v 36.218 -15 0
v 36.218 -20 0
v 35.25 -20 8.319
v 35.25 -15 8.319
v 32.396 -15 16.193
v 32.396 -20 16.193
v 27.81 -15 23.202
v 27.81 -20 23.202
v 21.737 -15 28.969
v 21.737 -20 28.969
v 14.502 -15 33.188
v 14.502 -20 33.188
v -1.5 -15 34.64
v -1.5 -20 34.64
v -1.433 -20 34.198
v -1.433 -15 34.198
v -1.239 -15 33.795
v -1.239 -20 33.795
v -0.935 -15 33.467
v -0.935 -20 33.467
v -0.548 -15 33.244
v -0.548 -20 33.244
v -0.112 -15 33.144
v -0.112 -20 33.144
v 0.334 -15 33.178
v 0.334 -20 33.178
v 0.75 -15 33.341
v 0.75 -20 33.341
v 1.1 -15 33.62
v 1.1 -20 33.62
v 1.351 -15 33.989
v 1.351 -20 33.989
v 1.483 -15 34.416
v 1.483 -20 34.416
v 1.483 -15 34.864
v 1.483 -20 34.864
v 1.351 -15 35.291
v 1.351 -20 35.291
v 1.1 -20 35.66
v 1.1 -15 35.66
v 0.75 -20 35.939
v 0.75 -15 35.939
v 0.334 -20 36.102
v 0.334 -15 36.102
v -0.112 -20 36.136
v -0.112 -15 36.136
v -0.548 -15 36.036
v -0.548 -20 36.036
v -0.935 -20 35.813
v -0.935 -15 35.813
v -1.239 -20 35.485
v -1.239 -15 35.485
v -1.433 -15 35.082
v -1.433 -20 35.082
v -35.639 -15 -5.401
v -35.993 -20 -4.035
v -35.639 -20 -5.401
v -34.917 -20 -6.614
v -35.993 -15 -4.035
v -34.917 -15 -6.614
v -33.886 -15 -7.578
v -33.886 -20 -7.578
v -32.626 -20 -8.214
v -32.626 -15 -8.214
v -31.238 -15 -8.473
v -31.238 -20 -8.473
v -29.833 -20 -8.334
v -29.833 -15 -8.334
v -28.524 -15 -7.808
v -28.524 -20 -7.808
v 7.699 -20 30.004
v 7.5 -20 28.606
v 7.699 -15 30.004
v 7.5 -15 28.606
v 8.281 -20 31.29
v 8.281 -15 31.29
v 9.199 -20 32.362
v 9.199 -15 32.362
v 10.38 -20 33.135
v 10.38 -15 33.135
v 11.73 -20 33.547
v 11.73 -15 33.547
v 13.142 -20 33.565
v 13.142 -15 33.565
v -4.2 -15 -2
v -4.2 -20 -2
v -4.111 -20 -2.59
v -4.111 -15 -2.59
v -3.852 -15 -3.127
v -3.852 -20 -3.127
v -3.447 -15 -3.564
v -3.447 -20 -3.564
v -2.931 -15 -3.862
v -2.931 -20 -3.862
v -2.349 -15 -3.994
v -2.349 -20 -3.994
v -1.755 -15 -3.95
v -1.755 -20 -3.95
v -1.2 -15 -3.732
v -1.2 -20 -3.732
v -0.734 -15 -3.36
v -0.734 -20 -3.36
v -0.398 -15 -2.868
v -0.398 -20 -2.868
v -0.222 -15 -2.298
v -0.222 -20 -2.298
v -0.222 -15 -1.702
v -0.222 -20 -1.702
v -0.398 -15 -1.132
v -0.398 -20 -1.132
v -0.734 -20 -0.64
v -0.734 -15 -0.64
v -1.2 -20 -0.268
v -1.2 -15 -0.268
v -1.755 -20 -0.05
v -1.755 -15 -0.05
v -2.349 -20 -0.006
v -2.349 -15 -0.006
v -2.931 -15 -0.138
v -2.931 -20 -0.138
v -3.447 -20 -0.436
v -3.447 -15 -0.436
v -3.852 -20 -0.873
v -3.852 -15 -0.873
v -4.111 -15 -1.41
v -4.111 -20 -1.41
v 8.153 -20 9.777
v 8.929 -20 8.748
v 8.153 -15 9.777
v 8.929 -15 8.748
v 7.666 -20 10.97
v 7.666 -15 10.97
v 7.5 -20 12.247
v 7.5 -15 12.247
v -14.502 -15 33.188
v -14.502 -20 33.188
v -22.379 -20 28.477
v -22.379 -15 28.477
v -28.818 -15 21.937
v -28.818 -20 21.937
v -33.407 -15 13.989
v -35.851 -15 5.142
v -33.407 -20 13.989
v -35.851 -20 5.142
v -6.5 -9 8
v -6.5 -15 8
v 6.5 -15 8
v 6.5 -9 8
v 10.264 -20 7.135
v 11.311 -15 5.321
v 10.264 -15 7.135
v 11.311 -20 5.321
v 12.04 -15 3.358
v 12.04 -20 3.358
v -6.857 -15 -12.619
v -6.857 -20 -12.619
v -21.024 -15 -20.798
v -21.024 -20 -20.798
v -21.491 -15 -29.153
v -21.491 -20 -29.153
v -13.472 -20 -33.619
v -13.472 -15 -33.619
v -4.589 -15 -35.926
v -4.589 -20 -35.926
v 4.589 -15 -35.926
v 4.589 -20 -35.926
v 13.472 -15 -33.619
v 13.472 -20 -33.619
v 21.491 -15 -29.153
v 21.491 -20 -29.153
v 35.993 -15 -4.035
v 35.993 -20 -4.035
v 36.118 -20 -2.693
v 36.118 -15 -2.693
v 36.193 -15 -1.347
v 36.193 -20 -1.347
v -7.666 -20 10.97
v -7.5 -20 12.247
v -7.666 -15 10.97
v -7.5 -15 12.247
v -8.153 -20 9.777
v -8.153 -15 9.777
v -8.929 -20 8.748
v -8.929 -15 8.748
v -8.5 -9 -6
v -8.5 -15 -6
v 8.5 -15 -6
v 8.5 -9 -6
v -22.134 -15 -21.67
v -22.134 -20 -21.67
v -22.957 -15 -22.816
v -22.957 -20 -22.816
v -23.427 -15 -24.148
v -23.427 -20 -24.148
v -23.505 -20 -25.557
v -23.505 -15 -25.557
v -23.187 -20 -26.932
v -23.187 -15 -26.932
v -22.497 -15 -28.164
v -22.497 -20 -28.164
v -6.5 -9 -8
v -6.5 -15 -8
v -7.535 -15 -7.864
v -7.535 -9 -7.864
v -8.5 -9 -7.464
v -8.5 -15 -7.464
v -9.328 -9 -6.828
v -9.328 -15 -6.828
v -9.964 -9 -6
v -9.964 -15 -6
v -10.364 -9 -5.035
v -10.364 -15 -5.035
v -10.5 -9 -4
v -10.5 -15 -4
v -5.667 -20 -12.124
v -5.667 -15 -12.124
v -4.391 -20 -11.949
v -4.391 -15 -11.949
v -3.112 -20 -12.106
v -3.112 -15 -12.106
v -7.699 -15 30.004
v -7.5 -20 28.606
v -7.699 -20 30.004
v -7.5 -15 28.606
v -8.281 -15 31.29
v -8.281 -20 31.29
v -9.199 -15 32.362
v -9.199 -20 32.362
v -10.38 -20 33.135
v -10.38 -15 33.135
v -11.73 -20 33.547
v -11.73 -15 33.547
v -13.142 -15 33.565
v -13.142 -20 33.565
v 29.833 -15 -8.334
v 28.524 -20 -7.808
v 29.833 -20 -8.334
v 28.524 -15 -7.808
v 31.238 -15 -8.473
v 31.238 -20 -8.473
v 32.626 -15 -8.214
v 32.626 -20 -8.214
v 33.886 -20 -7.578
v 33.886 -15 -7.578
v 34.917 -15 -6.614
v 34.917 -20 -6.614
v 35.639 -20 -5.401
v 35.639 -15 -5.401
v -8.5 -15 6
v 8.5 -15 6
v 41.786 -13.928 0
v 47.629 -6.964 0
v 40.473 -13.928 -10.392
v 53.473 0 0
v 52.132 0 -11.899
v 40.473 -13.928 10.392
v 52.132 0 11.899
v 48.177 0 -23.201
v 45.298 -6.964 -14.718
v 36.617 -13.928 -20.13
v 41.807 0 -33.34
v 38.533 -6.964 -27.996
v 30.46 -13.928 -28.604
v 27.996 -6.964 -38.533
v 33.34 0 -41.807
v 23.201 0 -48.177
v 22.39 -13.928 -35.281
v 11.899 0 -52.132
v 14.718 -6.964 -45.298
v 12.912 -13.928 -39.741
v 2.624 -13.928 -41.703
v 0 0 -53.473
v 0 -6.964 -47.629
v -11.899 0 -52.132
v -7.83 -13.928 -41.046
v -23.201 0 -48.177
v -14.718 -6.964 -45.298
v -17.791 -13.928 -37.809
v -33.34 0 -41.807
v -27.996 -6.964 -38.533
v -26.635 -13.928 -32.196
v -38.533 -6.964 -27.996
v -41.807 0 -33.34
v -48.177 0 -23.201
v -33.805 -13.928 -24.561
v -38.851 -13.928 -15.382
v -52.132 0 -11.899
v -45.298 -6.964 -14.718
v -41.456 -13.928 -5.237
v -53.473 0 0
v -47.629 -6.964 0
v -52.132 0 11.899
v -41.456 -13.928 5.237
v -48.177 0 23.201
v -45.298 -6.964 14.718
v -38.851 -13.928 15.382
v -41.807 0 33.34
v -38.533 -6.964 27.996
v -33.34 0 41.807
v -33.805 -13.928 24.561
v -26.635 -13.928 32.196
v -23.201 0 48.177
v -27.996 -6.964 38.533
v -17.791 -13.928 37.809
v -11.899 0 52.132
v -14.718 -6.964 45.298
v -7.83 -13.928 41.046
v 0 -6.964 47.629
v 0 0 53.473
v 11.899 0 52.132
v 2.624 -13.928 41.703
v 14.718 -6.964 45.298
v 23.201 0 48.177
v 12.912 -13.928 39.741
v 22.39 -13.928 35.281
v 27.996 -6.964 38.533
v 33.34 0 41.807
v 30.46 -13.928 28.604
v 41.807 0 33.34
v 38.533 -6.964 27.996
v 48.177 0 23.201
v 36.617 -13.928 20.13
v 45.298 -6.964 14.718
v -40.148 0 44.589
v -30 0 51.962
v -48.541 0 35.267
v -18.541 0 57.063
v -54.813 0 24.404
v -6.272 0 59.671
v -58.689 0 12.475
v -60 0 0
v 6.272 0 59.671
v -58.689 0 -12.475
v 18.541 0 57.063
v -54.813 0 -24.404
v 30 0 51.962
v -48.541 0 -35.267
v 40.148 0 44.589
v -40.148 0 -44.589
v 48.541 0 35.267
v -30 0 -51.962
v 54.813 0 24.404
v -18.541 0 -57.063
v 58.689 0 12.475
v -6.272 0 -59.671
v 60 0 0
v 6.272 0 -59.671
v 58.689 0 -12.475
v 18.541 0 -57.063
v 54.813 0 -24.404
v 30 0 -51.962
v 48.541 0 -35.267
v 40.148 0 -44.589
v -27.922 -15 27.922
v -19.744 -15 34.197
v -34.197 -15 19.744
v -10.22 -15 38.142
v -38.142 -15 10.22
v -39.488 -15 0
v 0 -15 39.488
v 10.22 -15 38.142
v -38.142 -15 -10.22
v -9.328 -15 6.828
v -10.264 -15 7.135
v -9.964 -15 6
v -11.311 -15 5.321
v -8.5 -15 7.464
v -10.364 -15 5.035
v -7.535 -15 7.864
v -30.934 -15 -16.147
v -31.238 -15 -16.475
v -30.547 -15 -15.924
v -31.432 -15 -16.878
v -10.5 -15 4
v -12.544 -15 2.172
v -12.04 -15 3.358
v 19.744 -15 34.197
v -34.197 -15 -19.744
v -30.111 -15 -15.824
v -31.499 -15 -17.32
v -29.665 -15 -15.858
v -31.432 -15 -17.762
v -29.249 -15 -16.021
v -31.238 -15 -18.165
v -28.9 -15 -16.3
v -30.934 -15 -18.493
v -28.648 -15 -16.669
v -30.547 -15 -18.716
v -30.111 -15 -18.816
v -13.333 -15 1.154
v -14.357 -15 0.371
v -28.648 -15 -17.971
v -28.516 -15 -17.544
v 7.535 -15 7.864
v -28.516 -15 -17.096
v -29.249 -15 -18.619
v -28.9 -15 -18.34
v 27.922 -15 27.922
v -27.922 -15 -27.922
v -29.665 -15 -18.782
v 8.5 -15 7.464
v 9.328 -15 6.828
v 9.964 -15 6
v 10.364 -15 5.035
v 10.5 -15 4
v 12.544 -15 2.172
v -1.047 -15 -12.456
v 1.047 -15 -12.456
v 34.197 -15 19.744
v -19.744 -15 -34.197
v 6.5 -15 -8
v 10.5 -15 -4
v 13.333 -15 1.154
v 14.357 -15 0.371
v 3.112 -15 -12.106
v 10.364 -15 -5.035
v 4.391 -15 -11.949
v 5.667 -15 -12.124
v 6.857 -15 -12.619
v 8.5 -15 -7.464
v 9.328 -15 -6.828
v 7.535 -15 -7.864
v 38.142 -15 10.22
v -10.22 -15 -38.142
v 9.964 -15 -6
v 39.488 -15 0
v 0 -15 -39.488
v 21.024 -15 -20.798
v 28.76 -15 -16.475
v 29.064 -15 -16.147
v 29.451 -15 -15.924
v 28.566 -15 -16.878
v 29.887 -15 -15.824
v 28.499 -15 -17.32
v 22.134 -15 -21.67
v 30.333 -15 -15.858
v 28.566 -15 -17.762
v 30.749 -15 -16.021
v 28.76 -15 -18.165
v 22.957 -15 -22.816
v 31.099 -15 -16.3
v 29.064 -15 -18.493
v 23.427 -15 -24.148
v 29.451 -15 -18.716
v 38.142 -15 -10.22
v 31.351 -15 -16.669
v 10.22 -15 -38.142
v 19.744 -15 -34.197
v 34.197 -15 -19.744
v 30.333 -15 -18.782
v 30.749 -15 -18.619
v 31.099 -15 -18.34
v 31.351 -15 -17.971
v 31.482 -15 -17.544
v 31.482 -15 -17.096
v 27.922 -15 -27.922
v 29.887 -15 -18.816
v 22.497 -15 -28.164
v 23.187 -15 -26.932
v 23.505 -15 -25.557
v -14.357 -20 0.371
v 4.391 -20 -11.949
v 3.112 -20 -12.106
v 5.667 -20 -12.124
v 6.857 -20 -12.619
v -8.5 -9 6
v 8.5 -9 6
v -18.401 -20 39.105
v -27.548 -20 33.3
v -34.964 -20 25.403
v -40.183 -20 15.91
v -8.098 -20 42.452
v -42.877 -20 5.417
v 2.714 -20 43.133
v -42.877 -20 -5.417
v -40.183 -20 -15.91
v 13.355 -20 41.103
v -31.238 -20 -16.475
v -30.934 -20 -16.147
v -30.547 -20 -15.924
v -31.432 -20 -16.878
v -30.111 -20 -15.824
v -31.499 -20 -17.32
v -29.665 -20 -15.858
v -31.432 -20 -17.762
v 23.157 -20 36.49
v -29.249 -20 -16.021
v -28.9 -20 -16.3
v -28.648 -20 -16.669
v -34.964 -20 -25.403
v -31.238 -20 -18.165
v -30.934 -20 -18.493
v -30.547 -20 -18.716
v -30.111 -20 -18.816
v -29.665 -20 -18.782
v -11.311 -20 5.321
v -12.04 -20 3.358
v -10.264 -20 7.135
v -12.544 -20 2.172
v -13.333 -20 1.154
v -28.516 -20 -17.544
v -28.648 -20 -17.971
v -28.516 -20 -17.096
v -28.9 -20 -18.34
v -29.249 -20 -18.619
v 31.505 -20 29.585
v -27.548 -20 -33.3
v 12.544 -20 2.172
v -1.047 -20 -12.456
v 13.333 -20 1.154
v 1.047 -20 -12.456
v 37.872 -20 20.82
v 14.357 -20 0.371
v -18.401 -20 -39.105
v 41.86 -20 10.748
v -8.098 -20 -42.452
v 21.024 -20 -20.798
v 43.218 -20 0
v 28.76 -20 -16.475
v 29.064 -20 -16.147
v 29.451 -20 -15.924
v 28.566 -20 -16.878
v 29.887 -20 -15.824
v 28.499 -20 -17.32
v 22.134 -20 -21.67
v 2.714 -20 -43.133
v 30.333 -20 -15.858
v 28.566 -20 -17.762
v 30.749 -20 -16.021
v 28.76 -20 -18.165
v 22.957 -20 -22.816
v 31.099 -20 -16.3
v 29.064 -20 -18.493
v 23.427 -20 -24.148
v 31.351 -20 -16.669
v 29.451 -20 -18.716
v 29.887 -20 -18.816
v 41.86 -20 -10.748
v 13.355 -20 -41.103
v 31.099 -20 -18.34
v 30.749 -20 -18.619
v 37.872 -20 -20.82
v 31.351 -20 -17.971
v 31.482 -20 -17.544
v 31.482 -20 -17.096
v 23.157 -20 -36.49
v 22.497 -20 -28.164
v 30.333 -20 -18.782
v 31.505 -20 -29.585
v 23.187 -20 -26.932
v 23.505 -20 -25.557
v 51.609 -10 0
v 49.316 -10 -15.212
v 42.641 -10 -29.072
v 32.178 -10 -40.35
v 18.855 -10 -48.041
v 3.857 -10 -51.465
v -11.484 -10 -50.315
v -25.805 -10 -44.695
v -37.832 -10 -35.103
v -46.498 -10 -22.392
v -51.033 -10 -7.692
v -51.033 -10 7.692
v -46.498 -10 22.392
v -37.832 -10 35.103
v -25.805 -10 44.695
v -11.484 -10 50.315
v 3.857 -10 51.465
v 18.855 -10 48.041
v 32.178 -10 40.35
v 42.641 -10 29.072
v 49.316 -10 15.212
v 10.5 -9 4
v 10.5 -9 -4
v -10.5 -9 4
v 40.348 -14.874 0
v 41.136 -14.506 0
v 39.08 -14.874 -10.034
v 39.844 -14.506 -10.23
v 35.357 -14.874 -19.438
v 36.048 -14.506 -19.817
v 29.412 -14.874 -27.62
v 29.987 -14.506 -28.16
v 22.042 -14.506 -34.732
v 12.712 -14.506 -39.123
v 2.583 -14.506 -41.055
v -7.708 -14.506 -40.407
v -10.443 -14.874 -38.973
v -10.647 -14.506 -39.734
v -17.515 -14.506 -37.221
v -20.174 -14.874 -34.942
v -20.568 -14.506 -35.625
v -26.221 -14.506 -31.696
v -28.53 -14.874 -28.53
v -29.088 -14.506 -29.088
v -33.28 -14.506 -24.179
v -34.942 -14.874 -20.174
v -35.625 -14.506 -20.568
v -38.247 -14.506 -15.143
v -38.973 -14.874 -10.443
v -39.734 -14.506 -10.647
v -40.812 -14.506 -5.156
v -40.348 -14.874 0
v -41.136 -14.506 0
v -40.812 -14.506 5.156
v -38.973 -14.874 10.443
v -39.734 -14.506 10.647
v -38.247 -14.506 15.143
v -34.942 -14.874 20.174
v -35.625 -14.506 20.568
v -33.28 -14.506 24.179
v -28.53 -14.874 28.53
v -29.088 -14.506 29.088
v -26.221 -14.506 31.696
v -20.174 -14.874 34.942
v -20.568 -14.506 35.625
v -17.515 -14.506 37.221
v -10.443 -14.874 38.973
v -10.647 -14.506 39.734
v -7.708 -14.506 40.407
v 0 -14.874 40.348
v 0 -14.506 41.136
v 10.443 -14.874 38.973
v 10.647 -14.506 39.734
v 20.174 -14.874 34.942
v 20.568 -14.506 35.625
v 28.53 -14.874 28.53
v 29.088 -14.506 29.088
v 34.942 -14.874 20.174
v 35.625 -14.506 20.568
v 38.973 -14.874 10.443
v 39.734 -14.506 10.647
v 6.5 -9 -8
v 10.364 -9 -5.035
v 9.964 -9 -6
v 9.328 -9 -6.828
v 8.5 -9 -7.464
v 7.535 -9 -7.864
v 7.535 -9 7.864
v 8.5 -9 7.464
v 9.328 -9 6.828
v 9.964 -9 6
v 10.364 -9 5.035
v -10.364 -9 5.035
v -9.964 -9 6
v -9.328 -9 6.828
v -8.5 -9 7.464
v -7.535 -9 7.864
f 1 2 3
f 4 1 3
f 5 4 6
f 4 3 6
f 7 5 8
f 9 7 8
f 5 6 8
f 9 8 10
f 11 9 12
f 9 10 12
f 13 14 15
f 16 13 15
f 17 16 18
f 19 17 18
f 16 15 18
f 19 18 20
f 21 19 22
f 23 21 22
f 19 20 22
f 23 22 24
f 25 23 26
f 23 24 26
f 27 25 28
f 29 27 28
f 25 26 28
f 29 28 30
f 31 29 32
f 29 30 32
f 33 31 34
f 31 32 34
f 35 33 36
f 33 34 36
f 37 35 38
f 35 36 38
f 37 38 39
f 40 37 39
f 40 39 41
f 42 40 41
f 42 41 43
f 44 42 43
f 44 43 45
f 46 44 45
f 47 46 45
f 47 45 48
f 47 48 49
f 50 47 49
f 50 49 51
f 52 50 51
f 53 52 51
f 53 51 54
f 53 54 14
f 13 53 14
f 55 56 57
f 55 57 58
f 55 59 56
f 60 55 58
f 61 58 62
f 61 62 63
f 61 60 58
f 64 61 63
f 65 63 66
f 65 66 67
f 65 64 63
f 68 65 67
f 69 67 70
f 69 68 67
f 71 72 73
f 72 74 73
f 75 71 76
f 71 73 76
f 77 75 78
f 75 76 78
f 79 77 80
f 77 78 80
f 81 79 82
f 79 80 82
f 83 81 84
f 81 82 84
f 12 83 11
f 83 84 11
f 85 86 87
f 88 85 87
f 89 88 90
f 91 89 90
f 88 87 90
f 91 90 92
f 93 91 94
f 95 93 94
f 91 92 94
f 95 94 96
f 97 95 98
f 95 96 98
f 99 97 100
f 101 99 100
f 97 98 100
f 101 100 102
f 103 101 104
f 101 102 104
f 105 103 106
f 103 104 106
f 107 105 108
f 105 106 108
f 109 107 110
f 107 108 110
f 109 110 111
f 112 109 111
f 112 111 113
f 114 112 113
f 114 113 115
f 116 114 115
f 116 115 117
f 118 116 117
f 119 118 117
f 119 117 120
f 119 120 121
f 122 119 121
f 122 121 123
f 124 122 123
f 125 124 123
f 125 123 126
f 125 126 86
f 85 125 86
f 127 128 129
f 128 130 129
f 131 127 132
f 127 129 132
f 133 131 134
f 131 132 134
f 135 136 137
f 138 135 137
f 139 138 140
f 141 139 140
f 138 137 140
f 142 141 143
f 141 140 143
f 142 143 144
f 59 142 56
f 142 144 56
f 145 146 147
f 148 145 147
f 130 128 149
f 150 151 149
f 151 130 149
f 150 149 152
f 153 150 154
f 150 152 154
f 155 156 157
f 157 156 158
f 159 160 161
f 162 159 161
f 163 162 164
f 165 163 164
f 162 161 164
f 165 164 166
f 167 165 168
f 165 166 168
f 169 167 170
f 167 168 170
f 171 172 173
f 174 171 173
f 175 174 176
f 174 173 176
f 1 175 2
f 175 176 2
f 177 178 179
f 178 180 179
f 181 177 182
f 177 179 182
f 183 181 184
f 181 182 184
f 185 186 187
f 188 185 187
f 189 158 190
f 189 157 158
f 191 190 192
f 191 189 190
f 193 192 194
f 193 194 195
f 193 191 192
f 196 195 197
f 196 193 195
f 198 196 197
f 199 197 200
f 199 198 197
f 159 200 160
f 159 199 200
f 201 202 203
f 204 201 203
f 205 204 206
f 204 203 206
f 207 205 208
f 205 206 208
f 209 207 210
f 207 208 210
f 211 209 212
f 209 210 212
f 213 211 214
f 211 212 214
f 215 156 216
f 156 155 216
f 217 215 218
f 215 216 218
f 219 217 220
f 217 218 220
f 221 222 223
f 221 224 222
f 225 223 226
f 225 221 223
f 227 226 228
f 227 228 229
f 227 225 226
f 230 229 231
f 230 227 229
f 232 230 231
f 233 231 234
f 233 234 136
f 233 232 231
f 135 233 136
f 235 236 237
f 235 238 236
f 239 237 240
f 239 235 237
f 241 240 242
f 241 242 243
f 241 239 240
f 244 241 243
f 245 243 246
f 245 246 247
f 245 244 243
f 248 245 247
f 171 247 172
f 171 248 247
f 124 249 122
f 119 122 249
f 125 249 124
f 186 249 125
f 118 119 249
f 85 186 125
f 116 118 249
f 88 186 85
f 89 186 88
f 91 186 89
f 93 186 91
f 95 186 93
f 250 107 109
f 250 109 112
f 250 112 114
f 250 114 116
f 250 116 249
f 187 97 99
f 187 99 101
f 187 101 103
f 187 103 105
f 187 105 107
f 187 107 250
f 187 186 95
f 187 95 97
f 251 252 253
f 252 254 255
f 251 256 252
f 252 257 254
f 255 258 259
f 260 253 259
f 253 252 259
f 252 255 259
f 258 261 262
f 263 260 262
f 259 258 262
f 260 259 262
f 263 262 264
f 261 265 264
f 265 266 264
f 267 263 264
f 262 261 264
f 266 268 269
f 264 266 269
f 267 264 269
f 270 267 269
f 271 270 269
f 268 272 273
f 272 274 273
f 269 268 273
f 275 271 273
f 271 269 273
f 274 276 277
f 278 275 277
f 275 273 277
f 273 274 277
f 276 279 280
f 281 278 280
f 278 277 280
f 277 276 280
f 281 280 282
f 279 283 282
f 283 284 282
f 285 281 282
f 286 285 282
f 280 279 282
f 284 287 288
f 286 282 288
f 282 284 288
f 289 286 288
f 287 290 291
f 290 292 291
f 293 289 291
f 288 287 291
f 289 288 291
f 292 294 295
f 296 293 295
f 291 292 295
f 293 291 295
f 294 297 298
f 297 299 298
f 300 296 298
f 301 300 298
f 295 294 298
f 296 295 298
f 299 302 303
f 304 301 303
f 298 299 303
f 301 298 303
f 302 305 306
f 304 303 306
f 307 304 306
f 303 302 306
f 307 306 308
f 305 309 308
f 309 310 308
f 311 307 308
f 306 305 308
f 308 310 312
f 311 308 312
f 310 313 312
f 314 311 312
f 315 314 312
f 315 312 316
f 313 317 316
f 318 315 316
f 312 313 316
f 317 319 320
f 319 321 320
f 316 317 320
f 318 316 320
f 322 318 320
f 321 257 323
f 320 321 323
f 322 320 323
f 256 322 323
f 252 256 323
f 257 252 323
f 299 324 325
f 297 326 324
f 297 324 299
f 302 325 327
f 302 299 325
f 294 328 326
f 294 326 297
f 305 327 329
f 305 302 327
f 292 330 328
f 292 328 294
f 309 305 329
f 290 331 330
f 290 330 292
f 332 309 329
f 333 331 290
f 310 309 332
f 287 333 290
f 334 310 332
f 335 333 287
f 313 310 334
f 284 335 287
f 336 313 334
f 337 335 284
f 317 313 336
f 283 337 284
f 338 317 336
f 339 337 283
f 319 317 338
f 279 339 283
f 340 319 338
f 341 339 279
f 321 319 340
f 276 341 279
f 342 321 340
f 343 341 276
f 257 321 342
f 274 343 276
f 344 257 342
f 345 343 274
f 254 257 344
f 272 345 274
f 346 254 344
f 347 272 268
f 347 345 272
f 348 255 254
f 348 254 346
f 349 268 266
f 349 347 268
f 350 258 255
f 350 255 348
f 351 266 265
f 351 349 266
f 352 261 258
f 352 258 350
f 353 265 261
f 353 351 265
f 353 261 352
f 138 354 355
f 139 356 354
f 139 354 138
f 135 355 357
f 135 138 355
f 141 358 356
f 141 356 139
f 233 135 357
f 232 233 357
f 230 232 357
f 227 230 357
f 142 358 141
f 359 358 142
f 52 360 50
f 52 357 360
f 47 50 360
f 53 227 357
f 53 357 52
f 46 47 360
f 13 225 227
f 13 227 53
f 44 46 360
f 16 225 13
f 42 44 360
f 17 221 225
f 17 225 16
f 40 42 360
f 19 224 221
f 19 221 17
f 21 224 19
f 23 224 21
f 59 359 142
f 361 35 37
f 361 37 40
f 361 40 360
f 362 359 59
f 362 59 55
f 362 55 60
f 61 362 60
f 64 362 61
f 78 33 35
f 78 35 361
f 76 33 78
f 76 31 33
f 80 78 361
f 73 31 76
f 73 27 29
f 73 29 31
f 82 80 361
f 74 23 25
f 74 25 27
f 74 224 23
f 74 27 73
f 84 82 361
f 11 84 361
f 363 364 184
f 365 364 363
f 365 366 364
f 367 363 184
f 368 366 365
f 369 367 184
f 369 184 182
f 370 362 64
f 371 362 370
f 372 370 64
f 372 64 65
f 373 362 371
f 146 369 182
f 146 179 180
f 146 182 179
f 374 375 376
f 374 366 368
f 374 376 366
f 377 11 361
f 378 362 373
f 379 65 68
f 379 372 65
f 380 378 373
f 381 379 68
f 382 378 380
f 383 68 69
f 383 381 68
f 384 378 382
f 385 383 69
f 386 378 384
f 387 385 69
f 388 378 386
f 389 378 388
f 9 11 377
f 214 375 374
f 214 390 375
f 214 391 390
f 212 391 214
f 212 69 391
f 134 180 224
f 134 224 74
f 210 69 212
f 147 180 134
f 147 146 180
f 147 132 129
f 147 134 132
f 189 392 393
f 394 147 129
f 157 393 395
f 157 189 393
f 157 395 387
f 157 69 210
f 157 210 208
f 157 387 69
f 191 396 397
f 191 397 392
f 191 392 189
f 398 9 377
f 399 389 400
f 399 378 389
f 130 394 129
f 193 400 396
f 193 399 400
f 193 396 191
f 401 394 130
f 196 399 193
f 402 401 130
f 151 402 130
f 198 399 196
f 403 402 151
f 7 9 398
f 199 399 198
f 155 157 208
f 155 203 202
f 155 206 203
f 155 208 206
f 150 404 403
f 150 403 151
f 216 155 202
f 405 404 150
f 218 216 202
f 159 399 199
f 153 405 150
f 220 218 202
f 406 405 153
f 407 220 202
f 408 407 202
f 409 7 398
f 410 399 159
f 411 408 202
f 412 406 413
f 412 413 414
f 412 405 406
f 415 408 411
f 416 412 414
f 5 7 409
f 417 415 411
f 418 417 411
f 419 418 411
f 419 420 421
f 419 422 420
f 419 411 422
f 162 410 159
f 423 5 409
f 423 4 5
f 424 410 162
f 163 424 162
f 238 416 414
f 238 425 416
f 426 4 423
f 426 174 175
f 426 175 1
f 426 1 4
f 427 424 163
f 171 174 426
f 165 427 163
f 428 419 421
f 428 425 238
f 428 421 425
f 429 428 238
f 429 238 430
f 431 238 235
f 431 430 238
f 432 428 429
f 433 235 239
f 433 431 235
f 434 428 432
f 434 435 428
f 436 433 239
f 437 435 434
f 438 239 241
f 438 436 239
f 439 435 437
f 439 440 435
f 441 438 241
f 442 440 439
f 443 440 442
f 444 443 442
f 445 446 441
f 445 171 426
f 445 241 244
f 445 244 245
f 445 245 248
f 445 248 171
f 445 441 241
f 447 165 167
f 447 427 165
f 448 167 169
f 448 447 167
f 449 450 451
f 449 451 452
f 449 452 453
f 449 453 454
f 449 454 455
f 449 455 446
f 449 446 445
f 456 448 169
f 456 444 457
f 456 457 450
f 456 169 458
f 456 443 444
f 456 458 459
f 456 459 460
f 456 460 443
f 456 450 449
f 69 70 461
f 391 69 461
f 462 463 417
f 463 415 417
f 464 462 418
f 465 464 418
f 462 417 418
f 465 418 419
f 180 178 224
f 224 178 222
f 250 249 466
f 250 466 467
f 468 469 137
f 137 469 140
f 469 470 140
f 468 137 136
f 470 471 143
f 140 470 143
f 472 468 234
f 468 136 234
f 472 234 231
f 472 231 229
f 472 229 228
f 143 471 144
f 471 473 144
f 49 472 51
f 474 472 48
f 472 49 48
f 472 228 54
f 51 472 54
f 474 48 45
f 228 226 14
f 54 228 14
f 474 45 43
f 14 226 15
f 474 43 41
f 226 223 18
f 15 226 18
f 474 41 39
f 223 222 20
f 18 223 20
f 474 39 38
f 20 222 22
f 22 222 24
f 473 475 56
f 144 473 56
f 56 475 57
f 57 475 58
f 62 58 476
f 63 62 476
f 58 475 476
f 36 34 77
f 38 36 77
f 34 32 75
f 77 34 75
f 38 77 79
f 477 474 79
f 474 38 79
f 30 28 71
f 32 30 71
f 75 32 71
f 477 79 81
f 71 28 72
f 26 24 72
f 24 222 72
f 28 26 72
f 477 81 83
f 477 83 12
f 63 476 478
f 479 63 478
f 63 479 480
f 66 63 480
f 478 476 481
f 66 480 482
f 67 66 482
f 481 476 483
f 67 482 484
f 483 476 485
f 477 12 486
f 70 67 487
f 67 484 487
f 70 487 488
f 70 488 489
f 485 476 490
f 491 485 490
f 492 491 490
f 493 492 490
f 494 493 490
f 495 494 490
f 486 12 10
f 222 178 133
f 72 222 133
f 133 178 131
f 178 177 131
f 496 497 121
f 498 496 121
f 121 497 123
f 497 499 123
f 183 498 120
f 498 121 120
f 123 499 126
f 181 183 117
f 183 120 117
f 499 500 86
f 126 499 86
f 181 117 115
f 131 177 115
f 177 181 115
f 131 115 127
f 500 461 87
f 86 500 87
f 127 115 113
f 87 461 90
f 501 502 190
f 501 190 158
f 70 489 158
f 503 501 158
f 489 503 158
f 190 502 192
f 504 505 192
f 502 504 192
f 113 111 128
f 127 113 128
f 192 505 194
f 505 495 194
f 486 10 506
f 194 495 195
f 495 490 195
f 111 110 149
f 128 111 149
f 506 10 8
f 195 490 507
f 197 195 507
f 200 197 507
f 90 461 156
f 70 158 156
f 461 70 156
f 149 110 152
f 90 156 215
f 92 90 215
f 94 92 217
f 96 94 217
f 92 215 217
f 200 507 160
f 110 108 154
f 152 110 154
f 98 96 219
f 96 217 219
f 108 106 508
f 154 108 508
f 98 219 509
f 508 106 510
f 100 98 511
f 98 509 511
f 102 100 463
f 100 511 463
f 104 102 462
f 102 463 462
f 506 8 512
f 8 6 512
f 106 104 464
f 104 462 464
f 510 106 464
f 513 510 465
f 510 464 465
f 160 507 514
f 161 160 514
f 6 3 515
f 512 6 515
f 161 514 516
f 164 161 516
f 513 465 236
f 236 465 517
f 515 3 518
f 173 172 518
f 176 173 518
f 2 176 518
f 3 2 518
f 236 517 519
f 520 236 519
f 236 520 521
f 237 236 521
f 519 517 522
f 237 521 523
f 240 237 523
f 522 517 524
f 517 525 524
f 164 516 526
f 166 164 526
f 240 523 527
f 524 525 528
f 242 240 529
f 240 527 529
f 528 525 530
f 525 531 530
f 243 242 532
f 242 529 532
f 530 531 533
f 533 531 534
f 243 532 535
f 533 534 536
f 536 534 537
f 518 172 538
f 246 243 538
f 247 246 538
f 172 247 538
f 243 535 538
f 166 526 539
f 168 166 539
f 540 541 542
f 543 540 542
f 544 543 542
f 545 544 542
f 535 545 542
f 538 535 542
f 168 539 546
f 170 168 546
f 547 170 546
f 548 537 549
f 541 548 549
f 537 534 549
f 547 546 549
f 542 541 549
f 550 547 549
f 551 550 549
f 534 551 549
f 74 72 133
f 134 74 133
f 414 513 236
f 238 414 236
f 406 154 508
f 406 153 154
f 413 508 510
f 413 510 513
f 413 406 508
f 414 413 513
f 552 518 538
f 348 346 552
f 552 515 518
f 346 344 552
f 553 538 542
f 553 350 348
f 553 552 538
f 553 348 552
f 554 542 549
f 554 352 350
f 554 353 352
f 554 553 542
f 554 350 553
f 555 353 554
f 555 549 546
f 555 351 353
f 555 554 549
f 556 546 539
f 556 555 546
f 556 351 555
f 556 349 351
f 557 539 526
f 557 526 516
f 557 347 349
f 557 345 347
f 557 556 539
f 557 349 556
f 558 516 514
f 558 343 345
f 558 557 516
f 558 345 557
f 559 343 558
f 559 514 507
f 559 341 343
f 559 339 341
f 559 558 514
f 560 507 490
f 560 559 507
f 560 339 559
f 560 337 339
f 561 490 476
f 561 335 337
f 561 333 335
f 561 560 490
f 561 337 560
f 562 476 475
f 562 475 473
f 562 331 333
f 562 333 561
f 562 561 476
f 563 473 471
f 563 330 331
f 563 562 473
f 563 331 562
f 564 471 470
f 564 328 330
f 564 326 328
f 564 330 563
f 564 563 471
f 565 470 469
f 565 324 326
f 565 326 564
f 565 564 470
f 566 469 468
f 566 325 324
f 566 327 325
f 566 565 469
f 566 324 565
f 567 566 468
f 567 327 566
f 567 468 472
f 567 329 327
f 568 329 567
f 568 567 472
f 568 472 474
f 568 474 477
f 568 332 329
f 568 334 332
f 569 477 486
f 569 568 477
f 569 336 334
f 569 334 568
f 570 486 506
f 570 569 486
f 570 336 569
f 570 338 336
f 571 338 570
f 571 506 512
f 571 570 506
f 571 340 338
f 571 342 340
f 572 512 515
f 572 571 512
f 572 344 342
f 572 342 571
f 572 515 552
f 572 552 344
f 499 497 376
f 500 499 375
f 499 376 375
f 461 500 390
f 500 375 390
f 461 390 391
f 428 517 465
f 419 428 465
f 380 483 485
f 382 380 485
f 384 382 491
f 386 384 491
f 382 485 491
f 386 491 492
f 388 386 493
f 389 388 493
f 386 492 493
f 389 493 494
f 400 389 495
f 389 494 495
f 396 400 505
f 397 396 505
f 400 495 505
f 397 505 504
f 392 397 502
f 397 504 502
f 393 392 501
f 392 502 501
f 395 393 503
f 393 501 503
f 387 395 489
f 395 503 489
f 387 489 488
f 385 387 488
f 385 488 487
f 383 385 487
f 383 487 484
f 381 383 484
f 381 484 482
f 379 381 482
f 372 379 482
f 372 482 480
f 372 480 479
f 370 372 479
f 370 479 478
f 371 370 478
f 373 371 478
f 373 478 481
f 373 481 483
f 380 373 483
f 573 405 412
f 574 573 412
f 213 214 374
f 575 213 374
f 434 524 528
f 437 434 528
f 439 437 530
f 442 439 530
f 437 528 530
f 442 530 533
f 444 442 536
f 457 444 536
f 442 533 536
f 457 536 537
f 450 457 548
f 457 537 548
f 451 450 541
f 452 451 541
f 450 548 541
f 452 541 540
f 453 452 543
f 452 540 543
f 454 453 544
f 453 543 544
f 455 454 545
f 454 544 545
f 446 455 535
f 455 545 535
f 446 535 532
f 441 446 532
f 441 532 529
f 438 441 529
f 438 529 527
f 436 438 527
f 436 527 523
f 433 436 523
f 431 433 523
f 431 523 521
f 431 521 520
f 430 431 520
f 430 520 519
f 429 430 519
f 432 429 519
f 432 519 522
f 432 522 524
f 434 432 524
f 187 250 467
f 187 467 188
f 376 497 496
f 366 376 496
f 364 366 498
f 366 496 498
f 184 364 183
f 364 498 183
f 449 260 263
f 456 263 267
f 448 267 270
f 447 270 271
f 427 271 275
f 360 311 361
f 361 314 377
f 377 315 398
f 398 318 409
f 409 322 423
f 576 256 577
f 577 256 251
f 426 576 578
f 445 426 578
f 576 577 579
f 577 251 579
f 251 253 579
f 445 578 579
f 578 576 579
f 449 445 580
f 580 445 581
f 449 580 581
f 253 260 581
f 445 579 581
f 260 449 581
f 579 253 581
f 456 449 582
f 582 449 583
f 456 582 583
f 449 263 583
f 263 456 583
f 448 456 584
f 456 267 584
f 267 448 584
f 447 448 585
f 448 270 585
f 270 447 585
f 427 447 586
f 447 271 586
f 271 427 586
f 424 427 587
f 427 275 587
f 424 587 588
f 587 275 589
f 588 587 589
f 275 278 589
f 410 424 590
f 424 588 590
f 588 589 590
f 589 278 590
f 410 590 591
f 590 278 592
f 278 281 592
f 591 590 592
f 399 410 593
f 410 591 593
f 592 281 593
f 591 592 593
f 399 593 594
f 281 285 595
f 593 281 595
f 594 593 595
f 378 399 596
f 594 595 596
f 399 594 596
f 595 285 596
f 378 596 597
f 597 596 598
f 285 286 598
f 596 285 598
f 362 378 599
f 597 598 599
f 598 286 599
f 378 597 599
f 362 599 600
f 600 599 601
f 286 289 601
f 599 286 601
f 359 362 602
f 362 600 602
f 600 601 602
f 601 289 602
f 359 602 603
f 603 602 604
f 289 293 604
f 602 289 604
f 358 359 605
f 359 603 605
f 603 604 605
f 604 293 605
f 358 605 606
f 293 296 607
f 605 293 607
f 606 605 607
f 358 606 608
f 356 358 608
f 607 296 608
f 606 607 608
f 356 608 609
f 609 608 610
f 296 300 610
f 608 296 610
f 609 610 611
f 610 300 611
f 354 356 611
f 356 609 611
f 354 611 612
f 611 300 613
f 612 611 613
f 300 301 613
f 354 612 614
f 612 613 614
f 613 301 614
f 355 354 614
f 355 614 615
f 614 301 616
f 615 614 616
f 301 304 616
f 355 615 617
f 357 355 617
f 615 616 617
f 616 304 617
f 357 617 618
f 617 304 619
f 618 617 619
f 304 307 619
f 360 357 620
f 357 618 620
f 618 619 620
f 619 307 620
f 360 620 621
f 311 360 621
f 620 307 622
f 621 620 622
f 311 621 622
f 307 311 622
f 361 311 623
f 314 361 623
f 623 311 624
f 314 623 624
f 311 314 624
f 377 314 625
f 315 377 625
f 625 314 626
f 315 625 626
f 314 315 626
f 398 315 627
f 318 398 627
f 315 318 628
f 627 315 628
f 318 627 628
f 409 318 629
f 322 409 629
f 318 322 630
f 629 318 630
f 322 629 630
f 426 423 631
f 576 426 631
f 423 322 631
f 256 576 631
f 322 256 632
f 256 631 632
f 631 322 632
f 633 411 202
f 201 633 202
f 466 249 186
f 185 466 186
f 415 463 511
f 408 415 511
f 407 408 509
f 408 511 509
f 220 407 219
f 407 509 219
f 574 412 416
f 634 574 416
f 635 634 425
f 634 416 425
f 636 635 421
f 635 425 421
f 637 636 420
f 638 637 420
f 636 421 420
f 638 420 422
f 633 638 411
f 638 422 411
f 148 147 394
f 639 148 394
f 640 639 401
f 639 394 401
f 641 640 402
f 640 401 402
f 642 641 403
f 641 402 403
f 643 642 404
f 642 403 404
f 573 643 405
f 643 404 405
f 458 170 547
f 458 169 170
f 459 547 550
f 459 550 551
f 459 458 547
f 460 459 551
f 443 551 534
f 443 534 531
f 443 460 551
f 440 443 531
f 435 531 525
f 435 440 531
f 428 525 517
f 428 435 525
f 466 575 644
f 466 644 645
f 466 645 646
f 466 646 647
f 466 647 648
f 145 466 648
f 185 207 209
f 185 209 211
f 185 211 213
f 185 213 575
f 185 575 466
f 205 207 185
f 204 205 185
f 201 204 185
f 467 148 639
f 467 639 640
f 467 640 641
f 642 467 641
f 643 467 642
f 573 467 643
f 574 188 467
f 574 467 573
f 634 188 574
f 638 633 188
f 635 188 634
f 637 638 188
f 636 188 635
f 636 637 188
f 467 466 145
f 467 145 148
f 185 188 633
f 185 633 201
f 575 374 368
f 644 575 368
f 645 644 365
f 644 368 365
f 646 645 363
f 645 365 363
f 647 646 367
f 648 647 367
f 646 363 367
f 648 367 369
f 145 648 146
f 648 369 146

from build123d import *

# Parameters (mm, degrees)
SKETCH1_R             = 60
BOSS_EXTRUDE1_DEPTH   = 20
BOSS_EXTRUDE1_DRAFT   = -40
SHELL1_T              = -5
CUT_EXTRUDE2_DEPTH    = 20
SKETCH3_W             = 17
SKETCH3_H             = 12
BOSS_EXTRUDE2_DEPTH   = 6
F_3_0MM_DOWEL_HOLE1_D = 3
F_4_0MM_DOWEL_HOLE1_D = 4
FILLET1_R             = 5
FILLET2_R             = 3


with BuildPart() as part:
    # Sketch1 → Boss-Extrude1 (with draft: the straight prism first)
    with BuildSketch(Plane(origin=(0, 0, 0), x_dir=(1, 0, 0), z_dir=(0, 1, 0))):
        Circle(SKETCH1_R)
    extrude(amount=-BOSS_EXTRUDE1_DEPTH)
    # Boss-Extrude1: the draft: its side faces are tilted about the plane it starts from
    boss_extrude1_sides = [part.faces().sort_by_distance(p)[0] for p in [
        (-60, -10, 0),
    ]]
    draft(boss_extrude1_sides, Plane(origin=(0, 0, 0), x_dir=(1, 0, 0), z_dir=(0, 1, 0)), BOSS_EXTRUDE1_DRAFT)

    # Shell1
    shell1_openings = [part.faces().sort_by_distance(p)[0] for p in [
        (0, 0, 0),
    ]]
    offset(amount=SHELL1_T, openings=shell1_openings, kind=Kind.INTERSECTION)

    # Sketch2 → Cut-Extrude2 (cut)
    with BuildSketch(Plane.XZ.offset(20)):
        with BuildLine():
            ThreePointArc((-7.5, 35.432951589), (-31.365714462, 18.109003688), (-34.435836207, -11.221285266))
            Line((-34.435836207, -11.221285266), (-12.410254038, 1.495190528))
            ThreePointArc((-12.410254038, 1.495190528), (-10.825317547, 6.25), (-7.5, 10))
            Line((-7.5, 10), (-7.5, 35.432951589))
        make_face()
        with BuildLine():
            Line((12.410254038, 1.495190528), (34.435836207, -11.221285266))
            ThreePointArc((34.435836207, -11.221285266), (35.769689879, -5.680963323), (36.218007376, 0))
            ThreePointArc((36.218007376, 0), (28.136978459, 22.804703495), (7.5, 35.432951589))
            Line((7.5, 35.432951589), (7.5, 10))
            ThreePointArc((7.5, 10), (10.825317547, 6.25), (12.410254038, 1.495190528))
        make_face()
        with BuildLine():
            ThreePointArc((-26.935836207, -24.211666323), (0, -36.218007376), (26.935836207, -24.211666323))
            Line((26.935836207, -24.211666323), (4.910254038, -11.495190528))
            ThreePointArc((4.910254038, -11.495190528), (0, -12.5), (-4.910254038, -11.495190528))
            Line((-4.910254038, -11.495190528), (-26.935836207, -24.211666323))
        make_face()
    extrude(amount=-CUT_EXTRUDE2_DEPTH, mode=Mode.SUBTRACT)

    # Sketch3 → Boss-Extrude2 (add)
    with BuildSketch(Plane(origin=(0, -15, 0), x_dir=(1, 0, 0), z_dir=(0, 1, 0))):
        with BuildLine():
            Line((-6.5, -8), (6.5, -8))
            ThreePointArc((6.5, -8), (9.328427125, -6.828427125), (10.5, -4))
            Line((10.5, -4), (10.5, 4))
            ThreePointArc((10.5, 4), (9.328427125, 6.828427125), (6.5, 8))
            Line((6.5, 8), (-6.5, 8))
            ThreePointArc((-6.5, 8), (-9.328427125, 6.828427125), (-10.5, 4))
            Line((-10.5, 4), (-10.5, -4))
            ThreePointArc((-10.5, -4), (-9.328427125, -6.828427125), (-6.5, -8))
        make_face()
        Rectangle(SKETCH3_W, SKETCH3_H, mode=Mode.SUBTRACT)
    extrude(amount=BOSS_EXTRUDE2_DEPTH)

    # Ø3.0mm Dowel Hole1 (through all)
    with Locations(Plane(origin=(0, -15, 0), x_dir=(1, 0, 0), z_dir=(0, 1, 0))):
        with Locations((-29.999119987, 17.32), (29.999119987, 17.32), (0, -34.64)):
            Hole(F_3_0MM_DOWEL_HOLE1_D / 2)

    # Ø4.0mm Dowel Hole1 (through all)
    with Locations(Plane(origin=(0, -15, 0), x_dir=(1, 0, 0), z_dir=(0, 1, 0))):
        with Locations((-2.2, 2)):
            Hole(F_4_0MM_DOWEL_HOLE1_D / 2)

    # Fillet1
    fillet1_edges = [part.edges().sort_by_distance(p)[0] for p in [
        (-26.935836207, -17.5, -24.211666323),
        (-4.910254038, -17.5, -11.495190528),
        (4.910254038, -17.5, -11.495190528),
        (26.935836207, -17.5, -24.211666323),
        (34.435836207, -17.5, -11.221285266),
        (12.410254038, -17.5, 1.495190528),
        (7.5, -17.5, 10),
        (7.5, -17.5, 35.432951589),
        (-7.5, -17.5, 35.432951589),
        (-7.5, -17.5, 10),
        (-12.410254038, -17.5, 1.495190528),
        (-34.435836207, -17.5, -11.221285266),
    ]]
    fillet(fillet1_edges, radius=FILLET1_R)

    # Fillet2
    fillet2_edges = [part.edges().sort_by_distance(p)[0] for p in [
        (-40.886469086, -15, 0),
    ]]
    fillet(fillet2_edges, radius=FILLET2_R)


solid = part.part
